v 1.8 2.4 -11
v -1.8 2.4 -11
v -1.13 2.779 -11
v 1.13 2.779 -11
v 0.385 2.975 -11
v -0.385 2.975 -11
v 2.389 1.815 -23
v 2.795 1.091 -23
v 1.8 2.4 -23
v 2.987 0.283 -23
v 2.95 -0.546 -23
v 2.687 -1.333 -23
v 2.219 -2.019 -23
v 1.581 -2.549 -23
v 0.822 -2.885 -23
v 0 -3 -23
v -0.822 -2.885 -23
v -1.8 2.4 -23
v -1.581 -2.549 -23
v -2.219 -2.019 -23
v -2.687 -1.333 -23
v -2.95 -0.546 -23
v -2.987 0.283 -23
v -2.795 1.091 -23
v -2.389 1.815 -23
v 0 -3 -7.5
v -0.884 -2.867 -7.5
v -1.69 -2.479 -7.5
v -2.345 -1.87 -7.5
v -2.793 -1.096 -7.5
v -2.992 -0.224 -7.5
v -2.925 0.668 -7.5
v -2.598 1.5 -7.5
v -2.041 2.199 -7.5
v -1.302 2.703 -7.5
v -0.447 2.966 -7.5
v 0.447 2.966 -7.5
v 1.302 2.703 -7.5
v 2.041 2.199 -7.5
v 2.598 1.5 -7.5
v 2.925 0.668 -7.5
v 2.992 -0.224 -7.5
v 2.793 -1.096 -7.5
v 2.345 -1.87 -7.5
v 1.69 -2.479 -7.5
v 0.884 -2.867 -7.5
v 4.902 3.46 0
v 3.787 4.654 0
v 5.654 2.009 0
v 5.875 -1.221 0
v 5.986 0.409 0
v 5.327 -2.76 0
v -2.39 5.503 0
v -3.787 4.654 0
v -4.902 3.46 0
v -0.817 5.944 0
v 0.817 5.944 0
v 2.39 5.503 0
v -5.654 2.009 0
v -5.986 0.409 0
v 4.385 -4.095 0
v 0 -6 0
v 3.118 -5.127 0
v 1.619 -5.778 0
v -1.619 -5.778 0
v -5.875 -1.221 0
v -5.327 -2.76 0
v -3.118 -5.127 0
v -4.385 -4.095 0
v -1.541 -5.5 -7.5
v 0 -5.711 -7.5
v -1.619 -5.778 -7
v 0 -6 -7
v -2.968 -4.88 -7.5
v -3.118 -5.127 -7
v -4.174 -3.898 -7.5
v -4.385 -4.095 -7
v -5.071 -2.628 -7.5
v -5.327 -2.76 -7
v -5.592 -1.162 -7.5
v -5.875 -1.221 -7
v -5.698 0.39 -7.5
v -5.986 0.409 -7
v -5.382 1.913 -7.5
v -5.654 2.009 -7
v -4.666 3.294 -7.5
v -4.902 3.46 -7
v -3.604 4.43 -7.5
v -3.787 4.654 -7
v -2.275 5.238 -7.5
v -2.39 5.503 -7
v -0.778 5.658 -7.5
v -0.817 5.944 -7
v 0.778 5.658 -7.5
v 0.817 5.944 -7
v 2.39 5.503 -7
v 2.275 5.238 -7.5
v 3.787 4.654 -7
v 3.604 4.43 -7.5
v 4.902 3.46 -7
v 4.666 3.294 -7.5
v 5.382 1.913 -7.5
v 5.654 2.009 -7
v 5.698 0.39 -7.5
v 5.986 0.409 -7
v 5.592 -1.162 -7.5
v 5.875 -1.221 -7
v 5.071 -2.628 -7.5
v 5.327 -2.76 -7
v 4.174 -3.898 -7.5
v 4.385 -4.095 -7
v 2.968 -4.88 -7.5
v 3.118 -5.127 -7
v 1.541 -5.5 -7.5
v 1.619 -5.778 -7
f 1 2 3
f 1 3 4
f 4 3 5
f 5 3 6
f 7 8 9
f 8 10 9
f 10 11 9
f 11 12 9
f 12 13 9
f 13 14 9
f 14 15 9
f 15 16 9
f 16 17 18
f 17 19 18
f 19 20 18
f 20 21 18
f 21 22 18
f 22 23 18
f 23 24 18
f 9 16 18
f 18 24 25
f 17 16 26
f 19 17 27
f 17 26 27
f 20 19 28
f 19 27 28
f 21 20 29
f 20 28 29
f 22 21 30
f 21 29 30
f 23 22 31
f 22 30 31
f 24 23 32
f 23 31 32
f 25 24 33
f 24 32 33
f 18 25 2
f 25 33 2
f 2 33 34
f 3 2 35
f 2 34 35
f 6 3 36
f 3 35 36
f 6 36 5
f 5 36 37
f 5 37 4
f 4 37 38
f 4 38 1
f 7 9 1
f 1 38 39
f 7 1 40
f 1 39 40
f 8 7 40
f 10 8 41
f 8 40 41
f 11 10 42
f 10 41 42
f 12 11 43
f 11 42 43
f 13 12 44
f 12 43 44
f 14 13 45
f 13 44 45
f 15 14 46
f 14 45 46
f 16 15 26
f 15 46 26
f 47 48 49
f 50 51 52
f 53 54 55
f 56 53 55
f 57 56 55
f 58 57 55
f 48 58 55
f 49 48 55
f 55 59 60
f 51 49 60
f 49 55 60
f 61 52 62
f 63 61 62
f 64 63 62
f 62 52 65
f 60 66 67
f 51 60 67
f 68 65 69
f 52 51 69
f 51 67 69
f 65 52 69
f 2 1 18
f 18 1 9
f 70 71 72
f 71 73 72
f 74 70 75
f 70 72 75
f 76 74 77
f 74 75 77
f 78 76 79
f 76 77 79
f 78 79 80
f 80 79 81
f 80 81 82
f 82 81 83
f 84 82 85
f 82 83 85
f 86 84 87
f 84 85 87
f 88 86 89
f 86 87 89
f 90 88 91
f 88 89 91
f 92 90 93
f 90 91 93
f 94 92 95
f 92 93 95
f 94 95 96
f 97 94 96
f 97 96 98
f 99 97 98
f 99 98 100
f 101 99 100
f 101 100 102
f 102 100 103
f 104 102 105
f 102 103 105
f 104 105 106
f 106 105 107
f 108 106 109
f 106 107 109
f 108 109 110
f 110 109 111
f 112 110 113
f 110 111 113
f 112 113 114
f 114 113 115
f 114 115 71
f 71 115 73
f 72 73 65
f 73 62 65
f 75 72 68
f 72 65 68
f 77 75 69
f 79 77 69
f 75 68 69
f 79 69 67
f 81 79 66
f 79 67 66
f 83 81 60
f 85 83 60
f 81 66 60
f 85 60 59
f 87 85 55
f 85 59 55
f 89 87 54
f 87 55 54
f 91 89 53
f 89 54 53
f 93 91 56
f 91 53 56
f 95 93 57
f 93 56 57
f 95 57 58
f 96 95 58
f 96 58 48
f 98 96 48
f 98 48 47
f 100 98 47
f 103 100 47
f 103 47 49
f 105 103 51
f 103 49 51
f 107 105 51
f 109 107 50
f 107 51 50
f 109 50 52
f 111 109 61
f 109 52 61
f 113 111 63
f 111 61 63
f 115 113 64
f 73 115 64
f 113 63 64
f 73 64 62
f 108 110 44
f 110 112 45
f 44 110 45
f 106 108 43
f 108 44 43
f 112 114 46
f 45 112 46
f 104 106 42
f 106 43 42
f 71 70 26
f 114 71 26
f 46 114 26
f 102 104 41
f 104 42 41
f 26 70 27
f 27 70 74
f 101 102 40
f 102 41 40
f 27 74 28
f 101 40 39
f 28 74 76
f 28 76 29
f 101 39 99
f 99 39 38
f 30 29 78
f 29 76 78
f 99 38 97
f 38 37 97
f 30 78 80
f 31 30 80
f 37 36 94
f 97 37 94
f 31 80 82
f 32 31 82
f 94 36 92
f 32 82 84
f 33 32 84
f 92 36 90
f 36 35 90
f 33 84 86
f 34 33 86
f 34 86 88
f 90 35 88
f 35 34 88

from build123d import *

# Parameters (mm, degrees)
CROQUIS5_W            = 12
CROQUIS5_H            = 0.6
CORTAR_EXTRUIR2_DEPTH = 3


with BuildPart() as part:
    # Croquis2 → Revolución1 (revolve)
    with BuildSketch(Plane(origin=(0, 0, 7), x_dir=(0, 0, 1), z_dir=(-1, 0, 0)), mode=Mode.PRIVATE) as revoluci_n1_sk:
        Polygon((-7, 0), (-30, 0), (-30, 3), (-14.5, 3), (-14.5, 5.711324865), (-14, 6), (-7, 6), align=None)
    revolve(revoluci_n1_sk.sketch.rotate(Axis((0, 0, 0), (0, 0, -1)), 180), axis=Axis((0, 0, 0), (0, 0, -1)))

    # Croquis5 → Cortar-Extruir2 (cut, symmetric)
    with BuildSketch(Plane(origin=(0, 0, 0), x_dir=(0, 0, -1), z_dir=(1, 0, 0))):
        with Locations((17, 2.7)):
            Rectangle(CROQUIS5_W, CROQUIS5_H)
    extrude(amount=CORTAR_EXTRUIR2_DEPTH, both=True, mode=Mode.SUBTRACT)


solid = part.part
